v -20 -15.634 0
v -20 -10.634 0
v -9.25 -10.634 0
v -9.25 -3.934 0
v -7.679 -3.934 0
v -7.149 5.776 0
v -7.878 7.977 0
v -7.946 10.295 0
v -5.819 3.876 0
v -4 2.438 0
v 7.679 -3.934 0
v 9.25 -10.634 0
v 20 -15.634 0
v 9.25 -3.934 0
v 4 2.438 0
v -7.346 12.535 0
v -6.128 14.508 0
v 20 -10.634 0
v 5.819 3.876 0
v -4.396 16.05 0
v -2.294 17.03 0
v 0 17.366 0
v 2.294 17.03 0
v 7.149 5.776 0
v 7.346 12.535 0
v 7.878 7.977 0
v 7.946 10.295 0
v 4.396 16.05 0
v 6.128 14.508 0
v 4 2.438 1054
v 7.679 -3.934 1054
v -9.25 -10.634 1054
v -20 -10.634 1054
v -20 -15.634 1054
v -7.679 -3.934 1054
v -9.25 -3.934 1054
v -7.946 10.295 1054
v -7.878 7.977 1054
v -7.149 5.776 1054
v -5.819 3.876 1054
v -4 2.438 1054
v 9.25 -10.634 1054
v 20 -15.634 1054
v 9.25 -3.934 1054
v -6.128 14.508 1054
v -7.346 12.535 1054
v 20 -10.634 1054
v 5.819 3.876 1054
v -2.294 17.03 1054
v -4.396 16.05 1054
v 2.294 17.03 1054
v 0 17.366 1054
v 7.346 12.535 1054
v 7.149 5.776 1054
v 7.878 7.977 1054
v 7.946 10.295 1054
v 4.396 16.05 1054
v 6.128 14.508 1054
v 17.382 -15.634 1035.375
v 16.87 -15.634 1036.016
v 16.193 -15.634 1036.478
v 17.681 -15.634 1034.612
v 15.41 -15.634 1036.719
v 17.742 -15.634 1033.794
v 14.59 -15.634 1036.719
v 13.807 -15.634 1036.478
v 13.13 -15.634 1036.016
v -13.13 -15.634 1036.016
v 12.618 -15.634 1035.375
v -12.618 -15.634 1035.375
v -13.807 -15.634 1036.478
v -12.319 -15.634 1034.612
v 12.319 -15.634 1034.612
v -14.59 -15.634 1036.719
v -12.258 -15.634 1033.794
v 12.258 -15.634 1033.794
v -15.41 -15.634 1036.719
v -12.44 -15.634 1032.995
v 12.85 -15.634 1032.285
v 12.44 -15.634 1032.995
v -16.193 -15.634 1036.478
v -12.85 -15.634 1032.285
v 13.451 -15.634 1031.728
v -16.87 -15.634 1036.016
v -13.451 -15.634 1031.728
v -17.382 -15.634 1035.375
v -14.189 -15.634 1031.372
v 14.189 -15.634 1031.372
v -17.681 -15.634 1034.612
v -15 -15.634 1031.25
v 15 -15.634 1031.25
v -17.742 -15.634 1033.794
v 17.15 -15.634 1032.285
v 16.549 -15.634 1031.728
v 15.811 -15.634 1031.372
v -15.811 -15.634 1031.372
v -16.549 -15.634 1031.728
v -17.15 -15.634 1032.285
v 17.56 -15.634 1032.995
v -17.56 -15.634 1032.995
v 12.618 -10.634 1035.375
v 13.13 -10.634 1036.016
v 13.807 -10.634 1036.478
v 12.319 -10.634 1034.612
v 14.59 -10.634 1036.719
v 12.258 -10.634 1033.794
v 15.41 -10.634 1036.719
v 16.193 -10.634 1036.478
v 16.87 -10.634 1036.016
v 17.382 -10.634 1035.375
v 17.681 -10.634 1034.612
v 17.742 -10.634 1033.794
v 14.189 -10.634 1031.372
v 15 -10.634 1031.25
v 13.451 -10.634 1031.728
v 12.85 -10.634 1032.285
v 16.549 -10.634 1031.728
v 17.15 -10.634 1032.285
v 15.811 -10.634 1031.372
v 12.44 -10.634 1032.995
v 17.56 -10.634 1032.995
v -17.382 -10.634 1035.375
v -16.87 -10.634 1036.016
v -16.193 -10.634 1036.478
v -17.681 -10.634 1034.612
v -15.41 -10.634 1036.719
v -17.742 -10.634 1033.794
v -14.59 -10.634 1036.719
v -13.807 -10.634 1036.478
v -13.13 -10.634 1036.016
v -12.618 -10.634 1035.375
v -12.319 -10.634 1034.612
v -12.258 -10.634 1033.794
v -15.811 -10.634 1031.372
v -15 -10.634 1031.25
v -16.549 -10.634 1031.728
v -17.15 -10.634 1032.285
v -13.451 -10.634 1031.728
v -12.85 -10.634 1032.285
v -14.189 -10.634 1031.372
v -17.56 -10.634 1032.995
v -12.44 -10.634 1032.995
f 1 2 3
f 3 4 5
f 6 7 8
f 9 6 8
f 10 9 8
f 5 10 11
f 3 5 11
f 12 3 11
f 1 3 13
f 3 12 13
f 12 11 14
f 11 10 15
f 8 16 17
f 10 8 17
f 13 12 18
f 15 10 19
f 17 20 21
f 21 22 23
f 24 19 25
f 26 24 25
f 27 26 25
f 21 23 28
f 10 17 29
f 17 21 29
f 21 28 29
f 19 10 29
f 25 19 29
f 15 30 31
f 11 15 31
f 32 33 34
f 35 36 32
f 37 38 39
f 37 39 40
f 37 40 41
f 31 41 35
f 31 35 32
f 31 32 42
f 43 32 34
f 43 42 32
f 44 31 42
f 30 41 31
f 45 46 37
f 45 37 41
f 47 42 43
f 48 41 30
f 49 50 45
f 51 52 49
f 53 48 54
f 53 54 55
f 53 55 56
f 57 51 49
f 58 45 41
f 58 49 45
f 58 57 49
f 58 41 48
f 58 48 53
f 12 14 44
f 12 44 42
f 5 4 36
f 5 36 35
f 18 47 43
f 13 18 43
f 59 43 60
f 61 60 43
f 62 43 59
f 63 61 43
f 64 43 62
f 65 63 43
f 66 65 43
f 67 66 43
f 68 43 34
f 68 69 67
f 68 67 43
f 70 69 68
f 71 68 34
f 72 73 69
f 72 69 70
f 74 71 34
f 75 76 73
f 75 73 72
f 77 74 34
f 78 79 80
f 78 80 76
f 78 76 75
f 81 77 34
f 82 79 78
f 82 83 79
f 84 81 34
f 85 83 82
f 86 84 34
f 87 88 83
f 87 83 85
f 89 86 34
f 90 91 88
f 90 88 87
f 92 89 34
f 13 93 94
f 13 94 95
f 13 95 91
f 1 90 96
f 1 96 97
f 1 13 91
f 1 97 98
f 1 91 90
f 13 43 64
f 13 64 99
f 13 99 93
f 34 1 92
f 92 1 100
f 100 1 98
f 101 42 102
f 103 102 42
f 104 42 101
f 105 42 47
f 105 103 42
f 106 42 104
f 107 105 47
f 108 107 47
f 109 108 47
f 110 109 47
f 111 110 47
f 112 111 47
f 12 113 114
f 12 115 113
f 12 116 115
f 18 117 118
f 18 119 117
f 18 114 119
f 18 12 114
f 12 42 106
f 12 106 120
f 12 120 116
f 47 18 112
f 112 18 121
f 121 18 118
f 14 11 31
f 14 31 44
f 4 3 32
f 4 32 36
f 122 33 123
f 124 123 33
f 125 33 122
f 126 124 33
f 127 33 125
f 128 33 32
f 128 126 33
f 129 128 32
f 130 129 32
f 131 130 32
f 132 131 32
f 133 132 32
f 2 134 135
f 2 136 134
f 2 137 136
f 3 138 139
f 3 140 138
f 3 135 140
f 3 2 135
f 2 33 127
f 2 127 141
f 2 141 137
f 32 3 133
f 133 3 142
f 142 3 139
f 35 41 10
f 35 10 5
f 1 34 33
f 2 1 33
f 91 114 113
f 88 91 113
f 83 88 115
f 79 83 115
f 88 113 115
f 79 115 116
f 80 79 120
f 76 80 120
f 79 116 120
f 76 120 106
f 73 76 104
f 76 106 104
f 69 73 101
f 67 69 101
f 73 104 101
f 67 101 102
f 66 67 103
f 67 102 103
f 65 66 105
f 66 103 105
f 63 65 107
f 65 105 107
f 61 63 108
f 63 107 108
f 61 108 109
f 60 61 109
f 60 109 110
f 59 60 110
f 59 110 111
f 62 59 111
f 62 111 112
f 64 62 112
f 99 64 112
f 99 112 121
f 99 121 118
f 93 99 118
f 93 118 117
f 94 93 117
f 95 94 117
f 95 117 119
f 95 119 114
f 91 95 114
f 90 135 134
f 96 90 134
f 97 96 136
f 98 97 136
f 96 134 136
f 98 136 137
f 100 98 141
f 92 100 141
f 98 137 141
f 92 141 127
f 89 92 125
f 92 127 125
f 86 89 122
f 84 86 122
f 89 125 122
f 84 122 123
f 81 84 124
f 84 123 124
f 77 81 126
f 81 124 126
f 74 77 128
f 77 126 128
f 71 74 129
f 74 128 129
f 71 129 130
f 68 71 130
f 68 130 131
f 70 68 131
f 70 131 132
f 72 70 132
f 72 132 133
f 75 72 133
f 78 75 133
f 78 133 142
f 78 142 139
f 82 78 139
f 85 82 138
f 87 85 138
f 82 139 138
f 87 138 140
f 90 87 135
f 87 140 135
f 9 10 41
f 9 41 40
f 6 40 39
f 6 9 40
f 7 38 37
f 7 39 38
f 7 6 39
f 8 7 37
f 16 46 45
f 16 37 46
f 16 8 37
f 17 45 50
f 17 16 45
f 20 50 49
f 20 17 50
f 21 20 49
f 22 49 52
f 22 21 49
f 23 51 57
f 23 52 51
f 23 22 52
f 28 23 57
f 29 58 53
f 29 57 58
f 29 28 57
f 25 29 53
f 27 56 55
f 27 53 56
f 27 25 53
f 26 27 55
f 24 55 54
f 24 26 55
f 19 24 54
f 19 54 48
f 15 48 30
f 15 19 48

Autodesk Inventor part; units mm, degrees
ref_plane "YZ Plane" through (0, 0, 0) normal (1, 0, 0) x (0, 1, 0)
ref_plane "XZ Plane" through (0, 0, 0) normal (0, 1, 0) x (-1, 0, 0)
ref_plane "XY Plane" through (0, 0, 0) normal (0, 0, 1) x (1, 0, 0)
sketch "Esboço1" plane through (0, 0, 0) normal (0, 0, 1) x (1, 0, 0)
  arc A0 (4, 2.4377) -> (-4, 2.4377) centre (0, 9.3659) ccw
  line L0 (9.25, -3.9341) -> (9.25, -10.6341)
  line L1 (-9.25, -10.6341) -> (-9.25, -3.9341)
  line L2 (4, -15.6341) -> (-4, -15.6341)
  line L3 (20, -15.6341) -> (-20, -15.6341)
  line L4 (-20, -15.6341) -> (-20, -10.6341)
  line L5 (20, -10.6341) -> (20, -15.6341)
  line L6 (7.6788, -3.9341) -> (9.25, -3.9341)
  line L7 (-9.25, -3.9341) -> (-7.6788, -3.9341)
  line L8 (9.25, -10.6341) -> (20, -10.6341)
  line L9 (-20, -10.6341) -> (-9.25, -10.6341)
  line L10 (-4, 2.4377) -> (-7.6788, -3.9341)
  line L11 (-17.4151, -20.798) -> (-22.4188, -29.4646)
  line L12 (17.4151, -20.798) -> (23.6527, -31.6017)
  line L13 (9.25, -15.6341) -> (4, -15.6341)
  line L14 (0, -15.6341) -> (-9.25, -15.6341)
  line L15 (4, 2.4377) -> (7.6788, -3.9341)
  dimension "d6" = 16
  dimension "d7" = 25
  dimension "d8" = 18.5
  dimension "d9" = 11.7
  dimension "d10" = 8
  dimension "d13" = 5
  dimension "d14" = 40
extrude "Extrusão1" add sketch "Esboço1" along normal blind 1054
sketch "Esboço3" plane through (-20, -15.6341, 0) normal (0, -1, 0) x (1, 0, 0)
  line L0 (0, 1054) -> (40, 1054) construction
  line L1 (20, 1054) -> (20, 0) construction
  line L2 (20, 1034) -> (5, 1034) construction
  line L3 (5, 1034) -> (20, 1034) construction
  line L4 (20, 1034) -> (35, 1034) construction
  circle A0 centre (5, 1034) radius 2.75
  circle A1 centre (35, 1034) radius 2.75
  line L5 (40, 0) -> (0, 0) construction
  dimension "d18" = 15
  dimension "d19" = 15
  dimension "d20" = 5.5
  dimension "d21" = 5.5
  dimension "d22" = 20
hole "Furo1" at (-15, -15.6341, 1034) at (15, -15.6341, 1034) direction (0, 1, 0) diameter 5.5 depth 8 tip angle 118
properties part number "SBR16_EIXO_Y_2"
